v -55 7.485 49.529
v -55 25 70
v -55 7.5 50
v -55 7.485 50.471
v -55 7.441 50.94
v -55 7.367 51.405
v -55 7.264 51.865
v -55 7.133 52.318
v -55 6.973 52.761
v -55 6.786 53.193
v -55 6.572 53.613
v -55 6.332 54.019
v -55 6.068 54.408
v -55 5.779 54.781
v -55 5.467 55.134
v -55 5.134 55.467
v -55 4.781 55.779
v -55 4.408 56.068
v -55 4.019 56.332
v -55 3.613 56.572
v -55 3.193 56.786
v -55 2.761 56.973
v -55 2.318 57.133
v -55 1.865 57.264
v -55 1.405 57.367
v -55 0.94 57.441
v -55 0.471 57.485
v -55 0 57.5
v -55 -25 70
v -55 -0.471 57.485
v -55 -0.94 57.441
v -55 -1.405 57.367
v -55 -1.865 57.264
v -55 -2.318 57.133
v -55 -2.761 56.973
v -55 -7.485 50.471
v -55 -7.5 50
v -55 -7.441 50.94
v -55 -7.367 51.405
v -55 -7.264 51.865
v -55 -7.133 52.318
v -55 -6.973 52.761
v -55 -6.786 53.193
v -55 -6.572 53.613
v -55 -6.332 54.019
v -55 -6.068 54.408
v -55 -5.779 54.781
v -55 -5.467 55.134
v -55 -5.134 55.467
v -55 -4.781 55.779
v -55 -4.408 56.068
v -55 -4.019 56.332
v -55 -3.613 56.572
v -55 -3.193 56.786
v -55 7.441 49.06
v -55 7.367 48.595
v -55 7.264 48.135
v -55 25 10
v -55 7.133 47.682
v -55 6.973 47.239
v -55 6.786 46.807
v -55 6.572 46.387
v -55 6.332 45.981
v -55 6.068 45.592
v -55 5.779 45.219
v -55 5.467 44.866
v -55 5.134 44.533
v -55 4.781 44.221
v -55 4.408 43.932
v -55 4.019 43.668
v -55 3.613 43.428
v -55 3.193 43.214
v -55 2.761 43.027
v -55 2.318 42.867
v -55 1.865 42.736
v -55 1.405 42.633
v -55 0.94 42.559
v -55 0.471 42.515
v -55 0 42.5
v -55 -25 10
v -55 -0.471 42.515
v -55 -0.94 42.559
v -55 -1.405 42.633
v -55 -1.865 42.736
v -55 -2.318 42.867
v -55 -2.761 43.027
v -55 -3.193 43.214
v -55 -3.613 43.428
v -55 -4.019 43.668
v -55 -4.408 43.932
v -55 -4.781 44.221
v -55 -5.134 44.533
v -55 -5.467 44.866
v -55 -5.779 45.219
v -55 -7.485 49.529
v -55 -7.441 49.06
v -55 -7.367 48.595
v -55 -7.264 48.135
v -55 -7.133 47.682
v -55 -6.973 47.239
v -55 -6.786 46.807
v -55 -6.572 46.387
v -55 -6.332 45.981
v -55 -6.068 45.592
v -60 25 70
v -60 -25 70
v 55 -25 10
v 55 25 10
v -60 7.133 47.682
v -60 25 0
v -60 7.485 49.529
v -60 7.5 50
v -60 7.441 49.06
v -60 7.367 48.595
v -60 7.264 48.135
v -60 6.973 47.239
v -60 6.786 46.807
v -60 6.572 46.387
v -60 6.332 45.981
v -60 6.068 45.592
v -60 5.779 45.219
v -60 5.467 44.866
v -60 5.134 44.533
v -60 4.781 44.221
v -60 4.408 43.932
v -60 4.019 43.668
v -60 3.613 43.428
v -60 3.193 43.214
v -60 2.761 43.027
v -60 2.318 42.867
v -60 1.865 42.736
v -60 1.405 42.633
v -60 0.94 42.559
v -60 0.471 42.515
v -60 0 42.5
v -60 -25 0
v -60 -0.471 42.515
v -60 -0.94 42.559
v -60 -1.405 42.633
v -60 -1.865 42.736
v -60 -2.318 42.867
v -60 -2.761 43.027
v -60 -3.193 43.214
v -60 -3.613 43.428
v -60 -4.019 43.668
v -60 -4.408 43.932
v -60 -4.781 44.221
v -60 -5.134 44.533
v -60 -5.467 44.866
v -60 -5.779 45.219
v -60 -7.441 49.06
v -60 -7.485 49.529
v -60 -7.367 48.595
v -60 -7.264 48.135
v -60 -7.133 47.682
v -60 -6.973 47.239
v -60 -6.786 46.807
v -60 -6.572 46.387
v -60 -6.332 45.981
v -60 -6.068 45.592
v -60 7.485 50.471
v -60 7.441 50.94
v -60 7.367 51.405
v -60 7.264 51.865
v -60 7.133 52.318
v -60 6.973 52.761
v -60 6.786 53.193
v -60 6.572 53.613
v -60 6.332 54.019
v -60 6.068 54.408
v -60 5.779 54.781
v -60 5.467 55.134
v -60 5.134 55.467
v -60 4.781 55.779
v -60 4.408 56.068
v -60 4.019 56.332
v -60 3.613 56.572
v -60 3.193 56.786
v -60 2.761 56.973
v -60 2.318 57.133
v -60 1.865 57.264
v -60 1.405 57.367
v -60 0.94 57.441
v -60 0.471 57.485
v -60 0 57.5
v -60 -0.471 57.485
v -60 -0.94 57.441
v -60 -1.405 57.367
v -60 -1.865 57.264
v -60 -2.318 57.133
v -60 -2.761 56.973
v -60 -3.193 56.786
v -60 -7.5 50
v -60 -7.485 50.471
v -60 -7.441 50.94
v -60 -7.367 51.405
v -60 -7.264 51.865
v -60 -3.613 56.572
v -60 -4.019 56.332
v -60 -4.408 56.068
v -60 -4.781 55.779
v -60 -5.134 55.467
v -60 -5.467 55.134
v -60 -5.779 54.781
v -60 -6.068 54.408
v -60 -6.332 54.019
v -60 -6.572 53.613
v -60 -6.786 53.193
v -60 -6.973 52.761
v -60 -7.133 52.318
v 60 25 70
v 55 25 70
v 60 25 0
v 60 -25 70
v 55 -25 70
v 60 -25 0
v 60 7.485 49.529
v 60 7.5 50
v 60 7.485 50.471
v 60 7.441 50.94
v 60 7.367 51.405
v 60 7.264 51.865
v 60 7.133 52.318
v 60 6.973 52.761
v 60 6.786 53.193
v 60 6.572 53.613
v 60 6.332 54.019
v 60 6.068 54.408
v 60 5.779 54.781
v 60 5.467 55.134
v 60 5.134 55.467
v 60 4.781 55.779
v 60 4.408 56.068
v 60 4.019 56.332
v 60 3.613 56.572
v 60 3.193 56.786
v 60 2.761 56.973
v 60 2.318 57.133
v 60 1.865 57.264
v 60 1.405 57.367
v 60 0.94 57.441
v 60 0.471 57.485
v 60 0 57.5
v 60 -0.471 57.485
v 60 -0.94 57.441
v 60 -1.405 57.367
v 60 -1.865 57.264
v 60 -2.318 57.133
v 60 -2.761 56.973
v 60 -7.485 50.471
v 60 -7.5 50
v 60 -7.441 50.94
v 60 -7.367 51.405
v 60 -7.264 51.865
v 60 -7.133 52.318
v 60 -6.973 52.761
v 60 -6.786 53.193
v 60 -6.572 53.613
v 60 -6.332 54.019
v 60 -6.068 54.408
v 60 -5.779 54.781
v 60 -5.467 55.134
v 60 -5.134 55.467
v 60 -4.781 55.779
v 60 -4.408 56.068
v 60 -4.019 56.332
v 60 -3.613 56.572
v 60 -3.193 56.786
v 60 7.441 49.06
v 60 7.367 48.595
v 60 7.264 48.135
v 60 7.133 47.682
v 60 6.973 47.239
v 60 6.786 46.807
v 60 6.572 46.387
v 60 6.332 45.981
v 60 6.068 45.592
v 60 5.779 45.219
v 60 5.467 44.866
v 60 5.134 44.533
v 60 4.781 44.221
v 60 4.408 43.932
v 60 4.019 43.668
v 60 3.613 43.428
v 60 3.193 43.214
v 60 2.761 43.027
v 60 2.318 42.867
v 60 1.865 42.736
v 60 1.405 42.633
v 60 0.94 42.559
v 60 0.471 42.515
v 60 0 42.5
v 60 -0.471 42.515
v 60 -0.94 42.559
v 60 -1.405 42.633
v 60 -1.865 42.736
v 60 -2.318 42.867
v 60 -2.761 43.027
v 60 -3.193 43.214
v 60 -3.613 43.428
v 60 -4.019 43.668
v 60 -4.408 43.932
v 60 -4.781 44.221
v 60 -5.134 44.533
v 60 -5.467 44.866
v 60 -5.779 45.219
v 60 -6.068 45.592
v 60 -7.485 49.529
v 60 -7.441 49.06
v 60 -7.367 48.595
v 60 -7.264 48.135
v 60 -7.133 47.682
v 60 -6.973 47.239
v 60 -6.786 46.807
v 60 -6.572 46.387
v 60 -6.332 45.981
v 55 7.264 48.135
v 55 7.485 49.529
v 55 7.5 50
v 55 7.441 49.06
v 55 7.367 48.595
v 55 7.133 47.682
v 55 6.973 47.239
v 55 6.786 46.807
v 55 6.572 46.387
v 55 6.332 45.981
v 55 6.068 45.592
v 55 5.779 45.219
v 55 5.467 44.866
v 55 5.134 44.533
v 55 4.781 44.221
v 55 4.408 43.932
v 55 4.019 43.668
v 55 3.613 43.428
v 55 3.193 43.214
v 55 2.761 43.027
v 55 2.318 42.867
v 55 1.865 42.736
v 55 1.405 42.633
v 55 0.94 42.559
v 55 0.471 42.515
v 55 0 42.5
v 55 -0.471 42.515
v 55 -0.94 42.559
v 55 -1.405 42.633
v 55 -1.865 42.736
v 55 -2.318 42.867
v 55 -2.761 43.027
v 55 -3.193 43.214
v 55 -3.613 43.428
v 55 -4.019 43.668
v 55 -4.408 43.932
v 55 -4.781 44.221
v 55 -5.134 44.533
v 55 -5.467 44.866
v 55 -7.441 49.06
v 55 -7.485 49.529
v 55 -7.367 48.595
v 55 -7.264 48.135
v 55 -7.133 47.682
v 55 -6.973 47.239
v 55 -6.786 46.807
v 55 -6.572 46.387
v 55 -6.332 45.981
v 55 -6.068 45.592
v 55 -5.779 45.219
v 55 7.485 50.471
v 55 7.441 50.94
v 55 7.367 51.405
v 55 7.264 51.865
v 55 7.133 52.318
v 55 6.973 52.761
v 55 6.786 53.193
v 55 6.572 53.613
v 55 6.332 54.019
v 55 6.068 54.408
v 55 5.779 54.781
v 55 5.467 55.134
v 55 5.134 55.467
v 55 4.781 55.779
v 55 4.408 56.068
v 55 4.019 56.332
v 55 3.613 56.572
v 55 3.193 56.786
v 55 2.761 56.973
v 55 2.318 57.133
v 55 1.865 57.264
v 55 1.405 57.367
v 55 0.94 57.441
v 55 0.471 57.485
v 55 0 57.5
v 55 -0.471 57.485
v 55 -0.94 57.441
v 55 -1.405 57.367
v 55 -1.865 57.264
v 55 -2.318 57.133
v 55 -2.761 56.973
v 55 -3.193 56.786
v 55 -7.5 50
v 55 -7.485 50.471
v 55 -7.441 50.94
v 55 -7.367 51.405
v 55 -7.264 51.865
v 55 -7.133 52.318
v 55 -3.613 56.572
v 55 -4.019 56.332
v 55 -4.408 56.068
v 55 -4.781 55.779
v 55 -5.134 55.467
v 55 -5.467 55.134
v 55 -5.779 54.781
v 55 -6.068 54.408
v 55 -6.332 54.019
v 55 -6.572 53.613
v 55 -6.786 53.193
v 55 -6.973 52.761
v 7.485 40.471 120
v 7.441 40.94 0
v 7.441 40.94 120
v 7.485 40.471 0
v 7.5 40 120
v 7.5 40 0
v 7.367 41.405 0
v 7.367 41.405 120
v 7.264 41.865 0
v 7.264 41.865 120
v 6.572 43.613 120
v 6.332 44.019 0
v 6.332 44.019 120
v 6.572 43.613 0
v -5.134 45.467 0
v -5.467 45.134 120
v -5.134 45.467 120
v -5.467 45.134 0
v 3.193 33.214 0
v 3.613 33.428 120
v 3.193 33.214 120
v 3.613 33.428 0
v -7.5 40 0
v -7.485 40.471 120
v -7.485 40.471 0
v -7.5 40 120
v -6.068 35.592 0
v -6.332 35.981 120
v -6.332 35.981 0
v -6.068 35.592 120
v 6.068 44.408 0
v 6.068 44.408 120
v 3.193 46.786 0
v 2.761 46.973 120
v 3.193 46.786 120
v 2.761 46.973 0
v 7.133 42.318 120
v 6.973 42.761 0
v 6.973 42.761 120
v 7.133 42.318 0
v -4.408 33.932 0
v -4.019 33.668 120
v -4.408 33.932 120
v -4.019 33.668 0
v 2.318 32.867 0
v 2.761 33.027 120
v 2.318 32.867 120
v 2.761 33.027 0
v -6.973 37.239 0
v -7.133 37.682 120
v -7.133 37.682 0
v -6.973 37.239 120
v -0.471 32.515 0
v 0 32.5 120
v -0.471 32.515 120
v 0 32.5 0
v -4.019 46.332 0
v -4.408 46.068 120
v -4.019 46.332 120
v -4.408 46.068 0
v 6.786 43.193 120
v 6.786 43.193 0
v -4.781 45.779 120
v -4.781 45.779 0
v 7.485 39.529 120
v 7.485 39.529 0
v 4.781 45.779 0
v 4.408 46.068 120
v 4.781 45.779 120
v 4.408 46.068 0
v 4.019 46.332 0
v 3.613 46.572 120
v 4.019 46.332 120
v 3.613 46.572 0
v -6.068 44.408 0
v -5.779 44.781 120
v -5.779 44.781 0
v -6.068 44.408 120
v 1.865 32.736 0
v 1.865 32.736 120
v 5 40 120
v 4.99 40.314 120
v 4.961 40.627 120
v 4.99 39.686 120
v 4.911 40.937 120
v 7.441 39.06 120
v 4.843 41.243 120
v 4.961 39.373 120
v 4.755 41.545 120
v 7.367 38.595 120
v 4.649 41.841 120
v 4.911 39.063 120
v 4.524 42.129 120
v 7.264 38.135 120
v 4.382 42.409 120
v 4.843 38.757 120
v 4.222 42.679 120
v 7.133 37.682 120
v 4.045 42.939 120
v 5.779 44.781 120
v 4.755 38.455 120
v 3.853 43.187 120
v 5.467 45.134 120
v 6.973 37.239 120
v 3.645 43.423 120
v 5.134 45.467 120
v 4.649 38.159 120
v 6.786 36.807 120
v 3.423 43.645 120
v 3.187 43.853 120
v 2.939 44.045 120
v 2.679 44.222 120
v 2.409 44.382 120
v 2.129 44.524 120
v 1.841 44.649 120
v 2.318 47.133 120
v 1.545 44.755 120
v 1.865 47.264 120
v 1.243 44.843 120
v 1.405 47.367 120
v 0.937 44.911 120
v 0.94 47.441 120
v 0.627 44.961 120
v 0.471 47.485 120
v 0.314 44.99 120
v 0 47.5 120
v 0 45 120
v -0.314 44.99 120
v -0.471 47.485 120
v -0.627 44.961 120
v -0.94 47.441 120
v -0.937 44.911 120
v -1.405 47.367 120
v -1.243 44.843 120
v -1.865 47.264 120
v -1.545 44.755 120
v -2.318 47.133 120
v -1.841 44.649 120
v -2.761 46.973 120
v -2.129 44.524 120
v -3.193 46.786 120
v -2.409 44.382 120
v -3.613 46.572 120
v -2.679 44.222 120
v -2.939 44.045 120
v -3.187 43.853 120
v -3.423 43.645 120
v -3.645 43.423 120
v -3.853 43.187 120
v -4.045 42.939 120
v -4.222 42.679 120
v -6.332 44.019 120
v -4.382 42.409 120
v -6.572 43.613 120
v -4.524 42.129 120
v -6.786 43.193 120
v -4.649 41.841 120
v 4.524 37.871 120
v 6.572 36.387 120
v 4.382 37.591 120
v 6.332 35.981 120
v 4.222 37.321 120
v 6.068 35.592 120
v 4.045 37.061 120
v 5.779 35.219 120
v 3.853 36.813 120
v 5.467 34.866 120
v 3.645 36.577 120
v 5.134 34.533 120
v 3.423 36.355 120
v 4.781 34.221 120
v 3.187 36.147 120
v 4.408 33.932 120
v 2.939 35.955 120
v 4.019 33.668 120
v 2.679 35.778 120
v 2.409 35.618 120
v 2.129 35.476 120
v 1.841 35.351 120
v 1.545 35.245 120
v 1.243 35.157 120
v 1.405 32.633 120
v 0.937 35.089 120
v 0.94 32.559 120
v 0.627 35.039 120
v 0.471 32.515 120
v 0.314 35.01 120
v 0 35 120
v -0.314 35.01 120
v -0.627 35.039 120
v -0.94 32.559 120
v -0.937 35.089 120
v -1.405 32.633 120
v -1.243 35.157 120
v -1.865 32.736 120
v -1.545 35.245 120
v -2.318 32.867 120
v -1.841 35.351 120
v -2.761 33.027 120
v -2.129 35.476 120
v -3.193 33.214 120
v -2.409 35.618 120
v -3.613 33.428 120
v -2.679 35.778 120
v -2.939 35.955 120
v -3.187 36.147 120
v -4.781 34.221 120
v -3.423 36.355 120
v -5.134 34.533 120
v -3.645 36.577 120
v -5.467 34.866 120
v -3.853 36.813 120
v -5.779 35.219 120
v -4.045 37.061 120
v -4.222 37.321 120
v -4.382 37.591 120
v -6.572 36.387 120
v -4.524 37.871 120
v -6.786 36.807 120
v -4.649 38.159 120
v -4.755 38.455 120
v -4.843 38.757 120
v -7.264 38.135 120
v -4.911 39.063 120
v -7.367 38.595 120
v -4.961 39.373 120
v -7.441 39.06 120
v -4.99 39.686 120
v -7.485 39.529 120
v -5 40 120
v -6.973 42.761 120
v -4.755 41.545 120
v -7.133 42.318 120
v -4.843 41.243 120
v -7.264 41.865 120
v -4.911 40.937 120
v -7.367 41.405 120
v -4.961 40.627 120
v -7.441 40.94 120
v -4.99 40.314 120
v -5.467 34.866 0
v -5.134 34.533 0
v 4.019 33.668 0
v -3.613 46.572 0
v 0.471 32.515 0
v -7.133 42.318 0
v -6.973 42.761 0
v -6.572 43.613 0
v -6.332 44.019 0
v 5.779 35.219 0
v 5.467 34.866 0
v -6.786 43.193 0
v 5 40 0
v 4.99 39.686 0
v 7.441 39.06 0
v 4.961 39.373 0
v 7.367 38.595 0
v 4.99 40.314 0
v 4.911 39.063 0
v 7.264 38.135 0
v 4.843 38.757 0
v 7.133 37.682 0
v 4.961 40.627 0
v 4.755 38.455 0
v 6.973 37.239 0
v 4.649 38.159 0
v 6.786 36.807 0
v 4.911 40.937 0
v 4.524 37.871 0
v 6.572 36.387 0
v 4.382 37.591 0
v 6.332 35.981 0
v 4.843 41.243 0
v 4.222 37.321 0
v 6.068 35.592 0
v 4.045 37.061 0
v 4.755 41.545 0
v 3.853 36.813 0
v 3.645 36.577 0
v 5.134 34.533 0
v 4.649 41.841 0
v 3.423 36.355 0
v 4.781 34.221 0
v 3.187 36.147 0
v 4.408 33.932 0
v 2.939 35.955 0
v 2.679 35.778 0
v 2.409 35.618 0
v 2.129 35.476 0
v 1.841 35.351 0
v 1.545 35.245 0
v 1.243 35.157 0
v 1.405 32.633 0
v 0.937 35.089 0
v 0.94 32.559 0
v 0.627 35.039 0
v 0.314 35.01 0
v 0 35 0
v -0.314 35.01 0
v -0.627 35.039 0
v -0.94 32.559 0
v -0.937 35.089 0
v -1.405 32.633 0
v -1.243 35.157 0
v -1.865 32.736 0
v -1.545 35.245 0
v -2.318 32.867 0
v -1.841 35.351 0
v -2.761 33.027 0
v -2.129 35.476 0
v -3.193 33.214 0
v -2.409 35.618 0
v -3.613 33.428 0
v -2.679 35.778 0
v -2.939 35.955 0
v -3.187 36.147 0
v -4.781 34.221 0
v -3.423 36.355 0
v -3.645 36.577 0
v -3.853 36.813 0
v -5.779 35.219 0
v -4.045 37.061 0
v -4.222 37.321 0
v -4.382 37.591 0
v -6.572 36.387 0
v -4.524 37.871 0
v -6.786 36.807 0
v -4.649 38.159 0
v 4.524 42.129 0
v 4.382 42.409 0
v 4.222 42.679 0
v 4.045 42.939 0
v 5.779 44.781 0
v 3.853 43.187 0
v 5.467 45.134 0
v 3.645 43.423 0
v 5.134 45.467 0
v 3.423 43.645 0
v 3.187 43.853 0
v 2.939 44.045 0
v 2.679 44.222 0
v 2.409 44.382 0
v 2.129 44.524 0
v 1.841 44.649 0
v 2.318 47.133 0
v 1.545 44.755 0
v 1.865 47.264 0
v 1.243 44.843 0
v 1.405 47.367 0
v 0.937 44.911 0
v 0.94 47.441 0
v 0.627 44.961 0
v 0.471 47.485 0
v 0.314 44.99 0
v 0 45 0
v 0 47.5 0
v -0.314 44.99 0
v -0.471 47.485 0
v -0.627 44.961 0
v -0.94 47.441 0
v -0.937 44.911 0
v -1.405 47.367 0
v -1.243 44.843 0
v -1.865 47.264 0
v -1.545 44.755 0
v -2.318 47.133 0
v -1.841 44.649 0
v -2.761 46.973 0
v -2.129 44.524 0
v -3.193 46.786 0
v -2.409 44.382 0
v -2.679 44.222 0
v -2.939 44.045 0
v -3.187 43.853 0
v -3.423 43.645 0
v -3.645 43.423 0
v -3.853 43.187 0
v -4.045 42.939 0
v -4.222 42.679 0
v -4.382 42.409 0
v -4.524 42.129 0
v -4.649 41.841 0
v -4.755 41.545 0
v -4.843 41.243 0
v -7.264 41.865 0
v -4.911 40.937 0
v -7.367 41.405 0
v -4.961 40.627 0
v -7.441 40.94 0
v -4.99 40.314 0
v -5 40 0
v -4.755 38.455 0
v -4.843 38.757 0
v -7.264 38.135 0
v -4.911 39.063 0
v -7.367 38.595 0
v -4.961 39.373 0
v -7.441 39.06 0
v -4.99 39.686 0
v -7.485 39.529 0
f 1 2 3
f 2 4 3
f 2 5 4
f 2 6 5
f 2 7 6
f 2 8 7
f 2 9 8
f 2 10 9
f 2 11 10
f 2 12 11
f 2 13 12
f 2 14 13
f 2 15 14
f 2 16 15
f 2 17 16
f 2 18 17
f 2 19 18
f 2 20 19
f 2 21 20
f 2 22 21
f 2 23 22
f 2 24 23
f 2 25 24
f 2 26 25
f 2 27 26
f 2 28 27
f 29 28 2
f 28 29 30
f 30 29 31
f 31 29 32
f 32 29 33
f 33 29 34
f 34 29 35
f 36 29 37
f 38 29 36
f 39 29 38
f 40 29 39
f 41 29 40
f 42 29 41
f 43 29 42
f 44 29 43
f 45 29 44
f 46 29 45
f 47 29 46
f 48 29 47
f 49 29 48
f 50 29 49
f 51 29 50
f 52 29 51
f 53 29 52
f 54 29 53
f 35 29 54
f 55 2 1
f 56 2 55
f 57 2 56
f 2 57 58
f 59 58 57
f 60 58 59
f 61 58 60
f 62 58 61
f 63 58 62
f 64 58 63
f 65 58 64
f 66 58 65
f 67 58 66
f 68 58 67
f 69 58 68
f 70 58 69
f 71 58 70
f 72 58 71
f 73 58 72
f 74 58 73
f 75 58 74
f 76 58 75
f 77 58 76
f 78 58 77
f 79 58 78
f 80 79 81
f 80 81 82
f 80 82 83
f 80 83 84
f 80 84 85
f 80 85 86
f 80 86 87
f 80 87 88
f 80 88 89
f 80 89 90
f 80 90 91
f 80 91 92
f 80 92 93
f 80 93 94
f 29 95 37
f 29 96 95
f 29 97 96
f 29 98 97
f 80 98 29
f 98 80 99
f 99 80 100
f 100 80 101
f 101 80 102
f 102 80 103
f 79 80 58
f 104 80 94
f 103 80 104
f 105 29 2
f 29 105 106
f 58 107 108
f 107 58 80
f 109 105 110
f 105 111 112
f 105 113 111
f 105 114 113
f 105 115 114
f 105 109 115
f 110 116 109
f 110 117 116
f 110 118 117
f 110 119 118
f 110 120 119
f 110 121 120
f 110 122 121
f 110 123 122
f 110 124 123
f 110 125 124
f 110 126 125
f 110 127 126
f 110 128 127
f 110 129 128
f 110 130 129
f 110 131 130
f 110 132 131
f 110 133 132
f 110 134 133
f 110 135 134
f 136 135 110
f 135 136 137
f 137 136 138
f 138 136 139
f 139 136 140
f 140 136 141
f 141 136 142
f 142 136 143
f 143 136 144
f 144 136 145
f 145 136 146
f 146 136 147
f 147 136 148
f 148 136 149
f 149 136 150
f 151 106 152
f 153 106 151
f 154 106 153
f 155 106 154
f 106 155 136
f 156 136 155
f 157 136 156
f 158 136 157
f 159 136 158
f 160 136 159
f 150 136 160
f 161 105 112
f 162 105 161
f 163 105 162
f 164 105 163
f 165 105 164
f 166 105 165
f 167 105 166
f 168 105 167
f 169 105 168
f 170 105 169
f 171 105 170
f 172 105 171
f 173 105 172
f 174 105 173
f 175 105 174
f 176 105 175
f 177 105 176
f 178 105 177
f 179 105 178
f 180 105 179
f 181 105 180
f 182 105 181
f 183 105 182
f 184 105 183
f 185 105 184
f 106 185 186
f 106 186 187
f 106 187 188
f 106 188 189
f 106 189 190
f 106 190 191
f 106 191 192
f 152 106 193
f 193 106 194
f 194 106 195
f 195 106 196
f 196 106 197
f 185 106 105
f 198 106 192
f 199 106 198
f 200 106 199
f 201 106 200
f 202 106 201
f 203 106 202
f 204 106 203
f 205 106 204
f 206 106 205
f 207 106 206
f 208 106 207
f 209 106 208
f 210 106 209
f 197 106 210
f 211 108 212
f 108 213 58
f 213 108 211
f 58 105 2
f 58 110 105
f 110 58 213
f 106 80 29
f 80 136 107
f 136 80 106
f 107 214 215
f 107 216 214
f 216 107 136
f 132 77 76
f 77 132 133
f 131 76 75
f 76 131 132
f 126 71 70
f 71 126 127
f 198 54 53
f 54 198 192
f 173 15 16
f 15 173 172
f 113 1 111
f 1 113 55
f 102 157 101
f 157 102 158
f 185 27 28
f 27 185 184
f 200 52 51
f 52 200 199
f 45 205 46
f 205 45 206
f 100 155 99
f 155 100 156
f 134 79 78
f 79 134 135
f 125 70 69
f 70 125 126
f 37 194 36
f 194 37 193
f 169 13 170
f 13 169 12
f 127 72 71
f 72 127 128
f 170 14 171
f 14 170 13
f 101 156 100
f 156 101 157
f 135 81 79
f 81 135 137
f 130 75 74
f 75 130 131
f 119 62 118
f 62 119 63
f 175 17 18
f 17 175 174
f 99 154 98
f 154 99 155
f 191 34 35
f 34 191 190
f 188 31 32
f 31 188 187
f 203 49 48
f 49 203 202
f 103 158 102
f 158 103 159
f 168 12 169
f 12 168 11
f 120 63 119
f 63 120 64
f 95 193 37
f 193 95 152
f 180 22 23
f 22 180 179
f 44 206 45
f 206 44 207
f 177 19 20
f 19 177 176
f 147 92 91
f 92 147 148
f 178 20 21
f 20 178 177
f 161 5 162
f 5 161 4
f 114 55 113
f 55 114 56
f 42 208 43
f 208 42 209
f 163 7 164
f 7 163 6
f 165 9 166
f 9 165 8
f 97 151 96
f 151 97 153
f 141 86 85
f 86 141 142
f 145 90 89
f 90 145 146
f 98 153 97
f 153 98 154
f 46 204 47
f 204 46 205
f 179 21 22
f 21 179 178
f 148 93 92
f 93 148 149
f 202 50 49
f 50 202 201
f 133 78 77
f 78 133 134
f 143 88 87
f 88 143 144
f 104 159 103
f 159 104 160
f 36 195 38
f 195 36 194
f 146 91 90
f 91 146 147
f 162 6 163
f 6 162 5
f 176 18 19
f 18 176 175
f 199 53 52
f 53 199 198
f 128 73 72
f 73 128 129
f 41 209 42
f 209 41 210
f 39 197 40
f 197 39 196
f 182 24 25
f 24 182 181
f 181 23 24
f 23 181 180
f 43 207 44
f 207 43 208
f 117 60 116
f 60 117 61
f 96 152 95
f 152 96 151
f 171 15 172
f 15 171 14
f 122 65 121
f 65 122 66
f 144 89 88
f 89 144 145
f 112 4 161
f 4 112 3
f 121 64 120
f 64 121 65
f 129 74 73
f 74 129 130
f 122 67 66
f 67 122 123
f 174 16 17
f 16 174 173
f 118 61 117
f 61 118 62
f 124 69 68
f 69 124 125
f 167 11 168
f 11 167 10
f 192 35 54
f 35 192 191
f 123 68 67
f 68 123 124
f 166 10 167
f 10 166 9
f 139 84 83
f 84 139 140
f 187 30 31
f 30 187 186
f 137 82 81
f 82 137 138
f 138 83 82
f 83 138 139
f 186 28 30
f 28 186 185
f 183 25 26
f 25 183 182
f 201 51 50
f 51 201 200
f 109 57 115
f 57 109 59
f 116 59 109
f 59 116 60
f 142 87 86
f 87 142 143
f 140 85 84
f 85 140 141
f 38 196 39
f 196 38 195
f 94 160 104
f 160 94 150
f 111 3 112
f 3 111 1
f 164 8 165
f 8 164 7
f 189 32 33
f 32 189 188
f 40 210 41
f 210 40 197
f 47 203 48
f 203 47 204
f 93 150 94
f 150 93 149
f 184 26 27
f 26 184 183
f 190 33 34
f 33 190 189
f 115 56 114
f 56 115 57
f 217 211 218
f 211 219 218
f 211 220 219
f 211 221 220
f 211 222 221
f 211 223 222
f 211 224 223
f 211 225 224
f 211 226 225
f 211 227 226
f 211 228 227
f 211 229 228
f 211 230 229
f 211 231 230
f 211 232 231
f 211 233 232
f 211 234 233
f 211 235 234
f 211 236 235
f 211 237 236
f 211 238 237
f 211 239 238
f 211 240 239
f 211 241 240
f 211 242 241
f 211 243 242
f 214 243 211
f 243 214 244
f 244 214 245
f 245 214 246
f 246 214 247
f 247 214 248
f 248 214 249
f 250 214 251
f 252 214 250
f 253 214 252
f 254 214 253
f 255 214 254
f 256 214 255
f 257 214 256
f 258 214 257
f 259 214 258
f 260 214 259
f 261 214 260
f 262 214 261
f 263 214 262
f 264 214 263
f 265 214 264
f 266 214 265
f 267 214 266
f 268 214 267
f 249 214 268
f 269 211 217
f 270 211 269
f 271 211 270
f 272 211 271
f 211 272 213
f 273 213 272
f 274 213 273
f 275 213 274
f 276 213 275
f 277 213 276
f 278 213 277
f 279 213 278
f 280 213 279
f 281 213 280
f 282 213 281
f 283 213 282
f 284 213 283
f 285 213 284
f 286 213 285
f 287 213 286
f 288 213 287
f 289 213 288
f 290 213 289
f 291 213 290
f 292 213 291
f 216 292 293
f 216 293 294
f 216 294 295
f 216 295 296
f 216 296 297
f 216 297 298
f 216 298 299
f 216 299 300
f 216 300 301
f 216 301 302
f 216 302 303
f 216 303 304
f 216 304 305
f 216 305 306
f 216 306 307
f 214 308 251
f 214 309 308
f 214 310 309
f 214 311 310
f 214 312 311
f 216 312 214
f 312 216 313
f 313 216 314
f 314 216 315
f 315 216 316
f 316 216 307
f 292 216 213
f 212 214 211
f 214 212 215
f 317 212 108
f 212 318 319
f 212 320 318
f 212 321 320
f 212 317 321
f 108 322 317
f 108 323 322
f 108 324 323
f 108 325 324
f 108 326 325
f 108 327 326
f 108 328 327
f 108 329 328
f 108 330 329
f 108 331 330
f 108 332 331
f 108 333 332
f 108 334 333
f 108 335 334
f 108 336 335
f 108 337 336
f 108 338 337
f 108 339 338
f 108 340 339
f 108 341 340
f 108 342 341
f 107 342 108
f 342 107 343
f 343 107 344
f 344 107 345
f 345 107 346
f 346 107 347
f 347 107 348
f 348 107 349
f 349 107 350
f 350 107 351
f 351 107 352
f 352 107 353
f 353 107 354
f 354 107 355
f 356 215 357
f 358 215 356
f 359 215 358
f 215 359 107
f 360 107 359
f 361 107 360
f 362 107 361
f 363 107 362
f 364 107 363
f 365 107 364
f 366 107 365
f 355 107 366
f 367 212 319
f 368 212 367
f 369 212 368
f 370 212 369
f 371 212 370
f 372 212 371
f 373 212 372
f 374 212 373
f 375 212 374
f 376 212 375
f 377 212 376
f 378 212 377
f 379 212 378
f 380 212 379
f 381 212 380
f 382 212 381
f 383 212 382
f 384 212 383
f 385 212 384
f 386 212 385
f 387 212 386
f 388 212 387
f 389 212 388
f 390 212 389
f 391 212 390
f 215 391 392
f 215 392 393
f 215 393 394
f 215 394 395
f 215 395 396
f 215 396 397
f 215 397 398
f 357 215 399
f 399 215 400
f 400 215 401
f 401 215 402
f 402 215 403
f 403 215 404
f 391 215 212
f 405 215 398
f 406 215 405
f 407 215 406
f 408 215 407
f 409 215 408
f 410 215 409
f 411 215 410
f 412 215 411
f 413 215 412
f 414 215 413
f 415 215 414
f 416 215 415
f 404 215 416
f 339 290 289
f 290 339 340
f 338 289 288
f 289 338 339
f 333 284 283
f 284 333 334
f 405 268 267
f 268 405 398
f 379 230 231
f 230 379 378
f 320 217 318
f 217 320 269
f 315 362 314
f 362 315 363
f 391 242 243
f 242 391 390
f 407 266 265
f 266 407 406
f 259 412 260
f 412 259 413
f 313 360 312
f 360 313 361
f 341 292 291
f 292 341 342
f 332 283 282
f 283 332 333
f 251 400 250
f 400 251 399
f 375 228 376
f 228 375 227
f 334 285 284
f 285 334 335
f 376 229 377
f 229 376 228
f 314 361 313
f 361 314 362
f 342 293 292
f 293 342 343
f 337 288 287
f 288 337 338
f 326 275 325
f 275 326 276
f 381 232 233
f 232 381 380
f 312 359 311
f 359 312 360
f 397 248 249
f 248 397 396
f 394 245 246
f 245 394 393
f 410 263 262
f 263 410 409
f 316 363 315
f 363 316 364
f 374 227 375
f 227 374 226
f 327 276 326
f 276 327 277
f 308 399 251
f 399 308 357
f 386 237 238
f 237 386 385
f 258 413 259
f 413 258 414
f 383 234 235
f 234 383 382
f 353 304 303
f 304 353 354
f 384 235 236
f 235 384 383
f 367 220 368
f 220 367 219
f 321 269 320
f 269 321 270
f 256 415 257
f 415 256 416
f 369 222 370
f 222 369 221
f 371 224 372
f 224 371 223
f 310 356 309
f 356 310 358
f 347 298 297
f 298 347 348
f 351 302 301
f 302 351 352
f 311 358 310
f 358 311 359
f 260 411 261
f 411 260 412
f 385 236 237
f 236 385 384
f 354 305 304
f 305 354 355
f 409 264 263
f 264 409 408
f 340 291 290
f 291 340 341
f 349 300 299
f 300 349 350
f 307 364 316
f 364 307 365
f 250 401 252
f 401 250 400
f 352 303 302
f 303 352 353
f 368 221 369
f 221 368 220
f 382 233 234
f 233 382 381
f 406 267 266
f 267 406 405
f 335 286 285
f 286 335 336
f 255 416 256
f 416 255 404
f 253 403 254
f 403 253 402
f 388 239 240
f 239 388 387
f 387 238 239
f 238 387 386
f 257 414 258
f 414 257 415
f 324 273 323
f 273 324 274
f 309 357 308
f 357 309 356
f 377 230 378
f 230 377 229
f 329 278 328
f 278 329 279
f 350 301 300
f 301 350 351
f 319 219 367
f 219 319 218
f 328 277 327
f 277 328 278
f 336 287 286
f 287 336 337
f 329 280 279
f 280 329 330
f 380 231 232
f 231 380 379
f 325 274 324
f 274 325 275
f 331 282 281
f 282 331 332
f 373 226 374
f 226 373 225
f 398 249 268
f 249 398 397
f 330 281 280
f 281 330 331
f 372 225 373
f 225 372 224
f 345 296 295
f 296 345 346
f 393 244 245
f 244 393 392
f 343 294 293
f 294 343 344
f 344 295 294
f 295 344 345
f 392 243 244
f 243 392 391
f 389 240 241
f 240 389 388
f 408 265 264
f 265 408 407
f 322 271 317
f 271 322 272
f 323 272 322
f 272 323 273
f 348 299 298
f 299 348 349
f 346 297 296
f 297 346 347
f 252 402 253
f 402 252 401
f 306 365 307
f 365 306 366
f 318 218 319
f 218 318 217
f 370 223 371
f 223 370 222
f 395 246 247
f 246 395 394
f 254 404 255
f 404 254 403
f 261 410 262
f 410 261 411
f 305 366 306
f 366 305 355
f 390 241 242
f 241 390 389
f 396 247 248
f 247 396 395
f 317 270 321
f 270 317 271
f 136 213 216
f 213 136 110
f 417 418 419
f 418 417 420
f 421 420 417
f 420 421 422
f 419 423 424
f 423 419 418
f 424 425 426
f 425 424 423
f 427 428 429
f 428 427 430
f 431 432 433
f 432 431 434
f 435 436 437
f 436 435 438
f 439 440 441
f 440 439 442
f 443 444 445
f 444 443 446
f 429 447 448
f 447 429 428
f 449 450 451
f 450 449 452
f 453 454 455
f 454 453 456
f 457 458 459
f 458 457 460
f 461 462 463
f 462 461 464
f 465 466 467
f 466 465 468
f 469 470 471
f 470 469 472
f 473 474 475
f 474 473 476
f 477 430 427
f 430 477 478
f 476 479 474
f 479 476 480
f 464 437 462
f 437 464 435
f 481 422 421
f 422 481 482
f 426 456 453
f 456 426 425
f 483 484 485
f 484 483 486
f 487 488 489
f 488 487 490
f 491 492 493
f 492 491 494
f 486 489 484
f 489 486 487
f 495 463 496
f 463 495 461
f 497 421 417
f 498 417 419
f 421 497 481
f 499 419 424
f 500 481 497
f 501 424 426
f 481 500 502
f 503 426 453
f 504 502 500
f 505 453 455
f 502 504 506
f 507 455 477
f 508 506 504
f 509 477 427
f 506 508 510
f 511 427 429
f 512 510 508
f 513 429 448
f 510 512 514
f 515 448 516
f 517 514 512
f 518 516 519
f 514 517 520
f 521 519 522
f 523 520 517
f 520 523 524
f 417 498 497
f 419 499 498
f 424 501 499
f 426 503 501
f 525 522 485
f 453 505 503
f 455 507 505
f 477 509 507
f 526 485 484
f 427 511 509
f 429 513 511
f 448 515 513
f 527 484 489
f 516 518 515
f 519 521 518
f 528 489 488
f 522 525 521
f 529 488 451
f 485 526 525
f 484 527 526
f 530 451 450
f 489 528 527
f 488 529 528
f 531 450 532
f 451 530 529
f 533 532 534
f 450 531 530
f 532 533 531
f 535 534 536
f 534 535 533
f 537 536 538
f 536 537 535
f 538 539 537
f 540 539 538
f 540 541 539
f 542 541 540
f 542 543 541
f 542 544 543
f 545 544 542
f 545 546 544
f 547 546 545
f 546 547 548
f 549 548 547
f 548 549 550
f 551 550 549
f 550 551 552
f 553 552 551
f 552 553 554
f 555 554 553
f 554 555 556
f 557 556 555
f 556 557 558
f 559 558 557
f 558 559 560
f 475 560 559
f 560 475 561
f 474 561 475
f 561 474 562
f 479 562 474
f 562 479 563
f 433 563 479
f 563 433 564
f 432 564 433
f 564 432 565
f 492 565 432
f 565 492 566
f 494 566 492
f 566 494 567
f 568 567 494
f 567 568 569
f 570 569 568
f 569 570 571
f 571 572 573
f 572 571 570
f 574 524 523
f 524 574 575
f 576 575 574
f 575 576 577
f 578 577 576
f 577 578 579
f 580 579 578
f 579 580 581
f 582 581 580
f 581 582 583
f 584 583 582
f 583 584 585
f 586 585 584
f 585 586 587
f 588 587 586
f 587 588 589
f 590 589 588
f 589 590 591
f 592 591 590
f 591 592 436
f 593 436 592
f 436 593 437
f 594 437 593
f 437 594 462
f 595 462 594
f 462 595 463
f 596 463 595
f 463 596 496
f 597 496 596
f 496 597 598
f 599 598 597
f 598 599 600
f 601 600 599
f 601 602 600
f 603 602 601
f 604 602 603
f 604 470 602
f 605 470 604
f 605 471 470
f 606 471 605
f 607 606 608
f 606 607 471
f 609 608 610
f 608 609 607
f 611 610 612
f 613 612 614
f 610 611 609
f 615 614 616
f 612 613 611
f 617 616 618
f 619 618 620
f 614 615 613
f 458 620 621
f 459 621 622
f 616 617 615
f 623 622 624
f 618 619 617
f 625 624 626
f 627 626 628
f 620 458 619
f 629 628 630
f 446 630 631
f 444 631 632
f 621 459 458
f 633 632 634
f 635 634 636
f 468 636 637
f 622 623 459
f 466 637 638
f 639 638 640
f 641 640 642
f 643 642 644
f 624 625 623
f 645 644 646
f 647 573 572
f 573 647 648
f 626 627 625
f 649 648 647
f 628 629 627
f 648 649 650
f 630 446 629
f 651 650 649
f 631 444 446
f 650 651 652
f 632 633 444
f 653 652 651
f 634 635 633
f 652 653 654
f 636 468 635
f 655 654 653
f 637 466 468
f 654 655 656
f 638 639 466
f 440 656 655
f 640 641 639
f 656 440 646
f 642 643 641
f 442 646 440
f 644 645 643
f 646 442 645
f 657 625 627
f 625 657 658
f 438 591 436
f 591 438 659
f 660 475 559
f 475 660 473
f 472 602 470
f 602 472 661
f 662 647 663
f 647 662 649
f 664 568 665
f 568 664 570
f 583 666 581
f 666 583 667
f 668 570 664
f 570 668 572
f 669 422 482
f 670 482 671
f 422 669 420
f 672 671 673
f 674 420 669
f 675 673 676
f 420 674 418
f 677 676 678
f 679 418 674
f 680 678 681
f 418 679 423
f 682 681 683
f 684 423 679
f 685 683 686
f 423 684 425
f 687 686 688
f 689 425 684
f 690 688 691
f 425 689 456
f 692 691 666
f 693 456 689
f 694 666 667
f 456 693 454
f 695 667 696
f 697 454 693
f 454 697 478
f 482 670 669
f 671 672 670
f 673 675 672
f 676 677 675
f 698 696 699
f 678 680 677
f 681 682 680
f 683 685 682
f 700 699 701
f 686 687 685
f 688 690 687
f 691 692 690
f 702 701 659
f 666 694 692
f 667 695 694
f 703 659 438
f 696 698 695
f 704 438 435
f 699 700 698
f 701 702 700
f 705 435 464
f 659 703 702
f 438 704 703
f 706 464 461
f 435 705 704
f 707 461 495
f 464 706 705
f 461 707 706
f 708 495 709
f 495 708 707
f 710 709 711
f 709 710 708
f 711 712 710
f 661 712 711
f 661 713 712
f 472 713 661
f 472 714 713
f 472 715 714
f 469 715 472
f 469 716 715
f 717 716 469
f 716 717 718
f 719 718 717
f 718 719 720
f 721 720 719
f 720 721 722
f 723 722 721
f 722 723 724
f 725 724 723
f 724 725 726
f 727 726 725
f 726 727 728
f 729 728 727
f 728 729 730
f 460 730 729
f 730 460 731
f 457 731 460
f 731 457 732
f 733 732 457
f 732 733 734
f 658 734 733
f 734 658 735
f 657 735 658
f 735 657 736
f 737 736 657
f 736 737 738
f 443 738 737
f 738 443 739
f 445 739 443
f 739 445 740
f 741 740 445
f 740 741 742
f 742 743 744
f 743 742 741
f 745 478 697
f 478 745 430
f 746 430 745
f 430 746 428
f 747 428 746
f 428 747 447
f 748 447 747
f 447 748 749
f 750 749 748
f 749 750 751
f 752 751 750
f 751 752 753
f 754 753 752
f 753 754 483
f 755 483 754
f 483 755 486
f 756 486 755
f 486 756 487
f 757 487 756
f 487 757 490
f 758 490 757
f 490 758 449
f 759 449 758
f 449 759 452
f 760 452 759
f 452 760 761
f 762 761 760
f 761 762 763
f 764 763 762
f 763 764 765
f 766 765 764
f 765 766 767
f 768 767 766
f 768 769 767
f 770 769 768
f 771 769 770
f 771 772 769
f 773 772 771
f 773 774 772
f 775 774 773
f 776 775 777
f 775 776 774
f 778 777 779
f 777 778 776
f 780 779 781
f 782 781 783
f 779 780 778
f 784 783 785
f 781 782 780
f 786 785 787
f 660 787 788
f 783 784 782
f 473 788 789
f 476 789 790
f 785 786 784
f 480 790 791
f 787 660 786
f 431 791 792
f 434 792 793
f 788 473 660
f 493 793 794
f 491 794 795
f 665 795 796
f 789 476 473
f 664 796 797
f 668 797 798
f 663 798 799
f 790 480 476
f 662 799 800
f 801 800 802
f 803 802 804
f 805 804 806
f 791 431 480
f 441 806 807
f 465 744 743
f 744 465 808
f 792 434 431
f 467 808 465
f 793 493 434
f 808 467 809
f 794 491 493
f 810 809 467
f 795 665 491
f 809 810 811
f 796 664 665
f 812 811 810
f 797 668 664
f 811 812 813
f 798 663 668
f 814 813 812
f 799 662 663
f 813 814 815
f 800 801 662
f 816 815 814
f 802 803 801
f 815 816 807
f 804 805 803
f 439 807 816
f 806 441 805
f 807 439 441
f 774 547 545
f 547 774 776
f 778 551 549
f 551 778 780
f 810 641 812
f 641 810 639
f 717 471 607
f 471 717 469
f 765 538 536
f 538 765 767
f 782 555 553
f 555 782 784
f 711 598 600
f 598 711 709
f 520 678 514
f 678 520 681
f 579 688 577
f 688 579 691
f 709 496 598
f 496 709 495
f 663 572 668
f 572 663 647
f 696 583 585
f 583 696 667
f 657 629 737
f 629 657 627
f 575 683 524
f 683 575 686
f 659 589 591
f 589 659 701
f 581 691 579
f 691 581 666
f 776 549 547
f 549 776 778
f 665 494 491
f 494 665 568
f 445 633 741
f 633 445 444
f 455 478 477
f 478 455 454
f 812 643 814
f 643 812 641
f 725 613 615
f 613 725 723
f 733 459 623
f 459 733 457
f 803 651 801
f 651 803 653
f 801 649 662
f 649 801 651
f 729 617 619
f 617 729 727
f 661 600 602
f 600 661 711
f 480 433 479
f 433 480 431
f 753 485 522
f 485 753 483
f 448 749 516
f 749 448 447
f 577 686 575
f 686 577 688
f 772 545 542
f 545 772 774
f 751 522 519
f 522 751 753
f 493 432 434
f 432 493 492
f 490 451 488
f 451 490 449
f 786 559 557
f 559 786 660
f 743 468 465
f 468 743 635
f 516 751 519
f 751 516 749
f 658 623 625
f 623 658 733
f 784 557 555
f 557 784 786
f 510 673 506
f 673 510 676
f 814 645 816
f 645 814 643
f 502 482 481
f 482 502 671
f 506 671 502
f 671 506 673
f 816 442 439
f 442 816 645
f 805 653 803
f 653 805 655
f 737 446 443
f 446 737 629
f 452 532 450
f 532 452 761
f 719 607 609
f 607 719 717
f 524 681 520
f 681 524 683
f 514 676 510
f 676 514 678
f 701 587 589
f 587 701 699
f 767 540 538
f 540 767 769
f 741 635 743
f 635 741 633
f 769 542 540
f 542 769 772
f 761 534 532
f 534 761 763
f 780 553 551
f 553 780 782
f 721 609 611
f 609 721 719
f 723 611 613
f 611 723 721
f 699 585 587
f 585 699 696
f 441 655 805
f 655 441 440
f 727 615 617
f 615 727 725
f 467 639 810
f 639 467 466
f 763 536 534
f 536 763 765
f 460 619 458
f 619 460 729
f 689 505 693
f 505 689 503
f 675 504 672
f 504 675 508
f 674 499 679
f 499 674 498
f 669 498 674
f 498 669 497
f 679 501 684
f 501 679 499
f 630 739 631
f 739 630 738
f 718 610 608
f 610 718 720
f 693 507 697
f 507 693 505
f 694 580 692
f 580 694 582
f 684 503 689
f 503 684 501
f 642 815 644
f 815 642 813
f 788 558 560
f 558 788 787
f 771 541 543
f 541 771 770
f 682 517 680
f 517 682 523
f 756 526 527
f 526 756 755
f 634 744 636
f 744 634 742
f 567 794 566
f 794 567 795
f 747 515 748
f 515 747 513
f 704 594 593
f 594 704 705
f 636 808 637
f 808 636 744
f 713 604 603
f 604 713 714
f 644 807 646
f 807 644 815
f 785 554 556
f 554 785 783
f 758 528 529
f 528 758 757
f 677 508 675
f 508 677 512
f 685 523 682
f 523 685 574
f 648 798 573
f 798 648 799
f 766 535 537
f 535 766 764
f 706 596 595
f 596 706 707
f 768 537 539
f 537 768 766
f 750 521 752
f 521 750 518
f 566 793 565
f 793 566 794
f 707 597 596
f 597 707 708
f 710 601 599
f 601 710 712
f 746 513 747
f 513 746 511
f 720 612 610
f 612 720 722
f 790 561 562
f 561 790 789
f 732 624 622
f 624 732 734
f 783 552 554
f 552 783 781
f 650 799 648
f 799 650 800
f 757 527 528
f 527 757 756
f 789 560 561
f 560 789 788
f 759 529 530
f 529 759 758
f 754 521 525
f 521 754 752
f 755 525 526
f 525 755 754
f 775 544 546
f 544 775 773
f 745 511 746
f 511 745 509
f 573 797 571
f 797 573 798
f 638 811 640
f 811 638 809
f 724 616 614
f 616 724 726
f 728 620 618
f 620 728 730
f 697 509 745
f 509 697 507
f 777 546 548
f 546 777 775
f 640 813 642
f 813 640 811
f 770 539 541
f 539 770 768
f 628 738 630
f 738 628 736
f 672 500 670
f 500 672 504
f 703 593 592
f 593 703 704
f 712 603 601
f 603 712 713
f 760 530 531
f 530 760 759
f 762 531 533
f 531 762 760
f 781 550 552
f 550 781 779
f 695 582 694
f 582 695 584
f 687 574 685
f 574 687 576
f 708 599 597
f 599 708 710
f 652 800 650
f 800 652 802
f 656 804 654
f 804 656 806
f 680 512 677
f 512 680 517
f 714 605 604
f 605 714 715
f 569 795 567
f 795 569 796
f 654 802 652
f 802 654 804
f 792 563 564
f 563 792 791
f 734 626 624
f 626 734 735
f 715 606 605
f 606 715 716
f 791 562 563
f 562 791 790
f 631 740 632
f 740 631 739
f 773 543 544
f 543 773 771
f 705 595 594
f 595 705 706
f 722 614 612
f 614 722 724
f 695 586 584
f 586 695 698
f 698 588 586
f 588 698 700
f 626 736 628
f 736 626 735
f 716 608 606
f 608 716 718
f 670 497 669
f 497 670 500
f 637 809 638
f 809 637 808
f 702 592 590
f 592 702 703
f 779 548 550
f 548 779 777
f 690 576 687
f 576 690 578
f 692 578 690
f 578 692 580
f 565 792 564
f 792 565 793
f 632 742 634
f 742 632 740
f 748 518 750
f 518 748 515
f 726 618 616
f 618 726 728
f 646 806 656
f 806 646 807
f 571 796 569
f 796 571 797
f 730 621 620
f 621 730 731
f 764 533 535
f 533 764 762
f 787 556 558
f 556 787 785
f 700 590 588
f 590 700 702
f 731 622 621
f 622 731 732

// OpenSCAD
union(){
    translate([-57.5,0,50])
    difference() {
        translate([0,0,-10])
        cube([5,50,60],true);
        
        rotate([0,90,0])
        cylinder(h=30, r=7.5, $fn=100, center=true);
    }
    translate([57.5,0,50])
    difference() {
        translate([0,0,-10])
        cube([5,50,60],true);
        rotate([0,90,0])
        cylinder(h=30, r=7.5, $fn=100, center=true);
    }
    
    translate([0,0,5])
    cube([120,50,10],true);
}

translate([0,40,60])
difference(){
    cylinder(h=120, r=7.5, $fn=100, center=true);
    cylinder(h=200, r=5, $fn=100, center=true);
}
